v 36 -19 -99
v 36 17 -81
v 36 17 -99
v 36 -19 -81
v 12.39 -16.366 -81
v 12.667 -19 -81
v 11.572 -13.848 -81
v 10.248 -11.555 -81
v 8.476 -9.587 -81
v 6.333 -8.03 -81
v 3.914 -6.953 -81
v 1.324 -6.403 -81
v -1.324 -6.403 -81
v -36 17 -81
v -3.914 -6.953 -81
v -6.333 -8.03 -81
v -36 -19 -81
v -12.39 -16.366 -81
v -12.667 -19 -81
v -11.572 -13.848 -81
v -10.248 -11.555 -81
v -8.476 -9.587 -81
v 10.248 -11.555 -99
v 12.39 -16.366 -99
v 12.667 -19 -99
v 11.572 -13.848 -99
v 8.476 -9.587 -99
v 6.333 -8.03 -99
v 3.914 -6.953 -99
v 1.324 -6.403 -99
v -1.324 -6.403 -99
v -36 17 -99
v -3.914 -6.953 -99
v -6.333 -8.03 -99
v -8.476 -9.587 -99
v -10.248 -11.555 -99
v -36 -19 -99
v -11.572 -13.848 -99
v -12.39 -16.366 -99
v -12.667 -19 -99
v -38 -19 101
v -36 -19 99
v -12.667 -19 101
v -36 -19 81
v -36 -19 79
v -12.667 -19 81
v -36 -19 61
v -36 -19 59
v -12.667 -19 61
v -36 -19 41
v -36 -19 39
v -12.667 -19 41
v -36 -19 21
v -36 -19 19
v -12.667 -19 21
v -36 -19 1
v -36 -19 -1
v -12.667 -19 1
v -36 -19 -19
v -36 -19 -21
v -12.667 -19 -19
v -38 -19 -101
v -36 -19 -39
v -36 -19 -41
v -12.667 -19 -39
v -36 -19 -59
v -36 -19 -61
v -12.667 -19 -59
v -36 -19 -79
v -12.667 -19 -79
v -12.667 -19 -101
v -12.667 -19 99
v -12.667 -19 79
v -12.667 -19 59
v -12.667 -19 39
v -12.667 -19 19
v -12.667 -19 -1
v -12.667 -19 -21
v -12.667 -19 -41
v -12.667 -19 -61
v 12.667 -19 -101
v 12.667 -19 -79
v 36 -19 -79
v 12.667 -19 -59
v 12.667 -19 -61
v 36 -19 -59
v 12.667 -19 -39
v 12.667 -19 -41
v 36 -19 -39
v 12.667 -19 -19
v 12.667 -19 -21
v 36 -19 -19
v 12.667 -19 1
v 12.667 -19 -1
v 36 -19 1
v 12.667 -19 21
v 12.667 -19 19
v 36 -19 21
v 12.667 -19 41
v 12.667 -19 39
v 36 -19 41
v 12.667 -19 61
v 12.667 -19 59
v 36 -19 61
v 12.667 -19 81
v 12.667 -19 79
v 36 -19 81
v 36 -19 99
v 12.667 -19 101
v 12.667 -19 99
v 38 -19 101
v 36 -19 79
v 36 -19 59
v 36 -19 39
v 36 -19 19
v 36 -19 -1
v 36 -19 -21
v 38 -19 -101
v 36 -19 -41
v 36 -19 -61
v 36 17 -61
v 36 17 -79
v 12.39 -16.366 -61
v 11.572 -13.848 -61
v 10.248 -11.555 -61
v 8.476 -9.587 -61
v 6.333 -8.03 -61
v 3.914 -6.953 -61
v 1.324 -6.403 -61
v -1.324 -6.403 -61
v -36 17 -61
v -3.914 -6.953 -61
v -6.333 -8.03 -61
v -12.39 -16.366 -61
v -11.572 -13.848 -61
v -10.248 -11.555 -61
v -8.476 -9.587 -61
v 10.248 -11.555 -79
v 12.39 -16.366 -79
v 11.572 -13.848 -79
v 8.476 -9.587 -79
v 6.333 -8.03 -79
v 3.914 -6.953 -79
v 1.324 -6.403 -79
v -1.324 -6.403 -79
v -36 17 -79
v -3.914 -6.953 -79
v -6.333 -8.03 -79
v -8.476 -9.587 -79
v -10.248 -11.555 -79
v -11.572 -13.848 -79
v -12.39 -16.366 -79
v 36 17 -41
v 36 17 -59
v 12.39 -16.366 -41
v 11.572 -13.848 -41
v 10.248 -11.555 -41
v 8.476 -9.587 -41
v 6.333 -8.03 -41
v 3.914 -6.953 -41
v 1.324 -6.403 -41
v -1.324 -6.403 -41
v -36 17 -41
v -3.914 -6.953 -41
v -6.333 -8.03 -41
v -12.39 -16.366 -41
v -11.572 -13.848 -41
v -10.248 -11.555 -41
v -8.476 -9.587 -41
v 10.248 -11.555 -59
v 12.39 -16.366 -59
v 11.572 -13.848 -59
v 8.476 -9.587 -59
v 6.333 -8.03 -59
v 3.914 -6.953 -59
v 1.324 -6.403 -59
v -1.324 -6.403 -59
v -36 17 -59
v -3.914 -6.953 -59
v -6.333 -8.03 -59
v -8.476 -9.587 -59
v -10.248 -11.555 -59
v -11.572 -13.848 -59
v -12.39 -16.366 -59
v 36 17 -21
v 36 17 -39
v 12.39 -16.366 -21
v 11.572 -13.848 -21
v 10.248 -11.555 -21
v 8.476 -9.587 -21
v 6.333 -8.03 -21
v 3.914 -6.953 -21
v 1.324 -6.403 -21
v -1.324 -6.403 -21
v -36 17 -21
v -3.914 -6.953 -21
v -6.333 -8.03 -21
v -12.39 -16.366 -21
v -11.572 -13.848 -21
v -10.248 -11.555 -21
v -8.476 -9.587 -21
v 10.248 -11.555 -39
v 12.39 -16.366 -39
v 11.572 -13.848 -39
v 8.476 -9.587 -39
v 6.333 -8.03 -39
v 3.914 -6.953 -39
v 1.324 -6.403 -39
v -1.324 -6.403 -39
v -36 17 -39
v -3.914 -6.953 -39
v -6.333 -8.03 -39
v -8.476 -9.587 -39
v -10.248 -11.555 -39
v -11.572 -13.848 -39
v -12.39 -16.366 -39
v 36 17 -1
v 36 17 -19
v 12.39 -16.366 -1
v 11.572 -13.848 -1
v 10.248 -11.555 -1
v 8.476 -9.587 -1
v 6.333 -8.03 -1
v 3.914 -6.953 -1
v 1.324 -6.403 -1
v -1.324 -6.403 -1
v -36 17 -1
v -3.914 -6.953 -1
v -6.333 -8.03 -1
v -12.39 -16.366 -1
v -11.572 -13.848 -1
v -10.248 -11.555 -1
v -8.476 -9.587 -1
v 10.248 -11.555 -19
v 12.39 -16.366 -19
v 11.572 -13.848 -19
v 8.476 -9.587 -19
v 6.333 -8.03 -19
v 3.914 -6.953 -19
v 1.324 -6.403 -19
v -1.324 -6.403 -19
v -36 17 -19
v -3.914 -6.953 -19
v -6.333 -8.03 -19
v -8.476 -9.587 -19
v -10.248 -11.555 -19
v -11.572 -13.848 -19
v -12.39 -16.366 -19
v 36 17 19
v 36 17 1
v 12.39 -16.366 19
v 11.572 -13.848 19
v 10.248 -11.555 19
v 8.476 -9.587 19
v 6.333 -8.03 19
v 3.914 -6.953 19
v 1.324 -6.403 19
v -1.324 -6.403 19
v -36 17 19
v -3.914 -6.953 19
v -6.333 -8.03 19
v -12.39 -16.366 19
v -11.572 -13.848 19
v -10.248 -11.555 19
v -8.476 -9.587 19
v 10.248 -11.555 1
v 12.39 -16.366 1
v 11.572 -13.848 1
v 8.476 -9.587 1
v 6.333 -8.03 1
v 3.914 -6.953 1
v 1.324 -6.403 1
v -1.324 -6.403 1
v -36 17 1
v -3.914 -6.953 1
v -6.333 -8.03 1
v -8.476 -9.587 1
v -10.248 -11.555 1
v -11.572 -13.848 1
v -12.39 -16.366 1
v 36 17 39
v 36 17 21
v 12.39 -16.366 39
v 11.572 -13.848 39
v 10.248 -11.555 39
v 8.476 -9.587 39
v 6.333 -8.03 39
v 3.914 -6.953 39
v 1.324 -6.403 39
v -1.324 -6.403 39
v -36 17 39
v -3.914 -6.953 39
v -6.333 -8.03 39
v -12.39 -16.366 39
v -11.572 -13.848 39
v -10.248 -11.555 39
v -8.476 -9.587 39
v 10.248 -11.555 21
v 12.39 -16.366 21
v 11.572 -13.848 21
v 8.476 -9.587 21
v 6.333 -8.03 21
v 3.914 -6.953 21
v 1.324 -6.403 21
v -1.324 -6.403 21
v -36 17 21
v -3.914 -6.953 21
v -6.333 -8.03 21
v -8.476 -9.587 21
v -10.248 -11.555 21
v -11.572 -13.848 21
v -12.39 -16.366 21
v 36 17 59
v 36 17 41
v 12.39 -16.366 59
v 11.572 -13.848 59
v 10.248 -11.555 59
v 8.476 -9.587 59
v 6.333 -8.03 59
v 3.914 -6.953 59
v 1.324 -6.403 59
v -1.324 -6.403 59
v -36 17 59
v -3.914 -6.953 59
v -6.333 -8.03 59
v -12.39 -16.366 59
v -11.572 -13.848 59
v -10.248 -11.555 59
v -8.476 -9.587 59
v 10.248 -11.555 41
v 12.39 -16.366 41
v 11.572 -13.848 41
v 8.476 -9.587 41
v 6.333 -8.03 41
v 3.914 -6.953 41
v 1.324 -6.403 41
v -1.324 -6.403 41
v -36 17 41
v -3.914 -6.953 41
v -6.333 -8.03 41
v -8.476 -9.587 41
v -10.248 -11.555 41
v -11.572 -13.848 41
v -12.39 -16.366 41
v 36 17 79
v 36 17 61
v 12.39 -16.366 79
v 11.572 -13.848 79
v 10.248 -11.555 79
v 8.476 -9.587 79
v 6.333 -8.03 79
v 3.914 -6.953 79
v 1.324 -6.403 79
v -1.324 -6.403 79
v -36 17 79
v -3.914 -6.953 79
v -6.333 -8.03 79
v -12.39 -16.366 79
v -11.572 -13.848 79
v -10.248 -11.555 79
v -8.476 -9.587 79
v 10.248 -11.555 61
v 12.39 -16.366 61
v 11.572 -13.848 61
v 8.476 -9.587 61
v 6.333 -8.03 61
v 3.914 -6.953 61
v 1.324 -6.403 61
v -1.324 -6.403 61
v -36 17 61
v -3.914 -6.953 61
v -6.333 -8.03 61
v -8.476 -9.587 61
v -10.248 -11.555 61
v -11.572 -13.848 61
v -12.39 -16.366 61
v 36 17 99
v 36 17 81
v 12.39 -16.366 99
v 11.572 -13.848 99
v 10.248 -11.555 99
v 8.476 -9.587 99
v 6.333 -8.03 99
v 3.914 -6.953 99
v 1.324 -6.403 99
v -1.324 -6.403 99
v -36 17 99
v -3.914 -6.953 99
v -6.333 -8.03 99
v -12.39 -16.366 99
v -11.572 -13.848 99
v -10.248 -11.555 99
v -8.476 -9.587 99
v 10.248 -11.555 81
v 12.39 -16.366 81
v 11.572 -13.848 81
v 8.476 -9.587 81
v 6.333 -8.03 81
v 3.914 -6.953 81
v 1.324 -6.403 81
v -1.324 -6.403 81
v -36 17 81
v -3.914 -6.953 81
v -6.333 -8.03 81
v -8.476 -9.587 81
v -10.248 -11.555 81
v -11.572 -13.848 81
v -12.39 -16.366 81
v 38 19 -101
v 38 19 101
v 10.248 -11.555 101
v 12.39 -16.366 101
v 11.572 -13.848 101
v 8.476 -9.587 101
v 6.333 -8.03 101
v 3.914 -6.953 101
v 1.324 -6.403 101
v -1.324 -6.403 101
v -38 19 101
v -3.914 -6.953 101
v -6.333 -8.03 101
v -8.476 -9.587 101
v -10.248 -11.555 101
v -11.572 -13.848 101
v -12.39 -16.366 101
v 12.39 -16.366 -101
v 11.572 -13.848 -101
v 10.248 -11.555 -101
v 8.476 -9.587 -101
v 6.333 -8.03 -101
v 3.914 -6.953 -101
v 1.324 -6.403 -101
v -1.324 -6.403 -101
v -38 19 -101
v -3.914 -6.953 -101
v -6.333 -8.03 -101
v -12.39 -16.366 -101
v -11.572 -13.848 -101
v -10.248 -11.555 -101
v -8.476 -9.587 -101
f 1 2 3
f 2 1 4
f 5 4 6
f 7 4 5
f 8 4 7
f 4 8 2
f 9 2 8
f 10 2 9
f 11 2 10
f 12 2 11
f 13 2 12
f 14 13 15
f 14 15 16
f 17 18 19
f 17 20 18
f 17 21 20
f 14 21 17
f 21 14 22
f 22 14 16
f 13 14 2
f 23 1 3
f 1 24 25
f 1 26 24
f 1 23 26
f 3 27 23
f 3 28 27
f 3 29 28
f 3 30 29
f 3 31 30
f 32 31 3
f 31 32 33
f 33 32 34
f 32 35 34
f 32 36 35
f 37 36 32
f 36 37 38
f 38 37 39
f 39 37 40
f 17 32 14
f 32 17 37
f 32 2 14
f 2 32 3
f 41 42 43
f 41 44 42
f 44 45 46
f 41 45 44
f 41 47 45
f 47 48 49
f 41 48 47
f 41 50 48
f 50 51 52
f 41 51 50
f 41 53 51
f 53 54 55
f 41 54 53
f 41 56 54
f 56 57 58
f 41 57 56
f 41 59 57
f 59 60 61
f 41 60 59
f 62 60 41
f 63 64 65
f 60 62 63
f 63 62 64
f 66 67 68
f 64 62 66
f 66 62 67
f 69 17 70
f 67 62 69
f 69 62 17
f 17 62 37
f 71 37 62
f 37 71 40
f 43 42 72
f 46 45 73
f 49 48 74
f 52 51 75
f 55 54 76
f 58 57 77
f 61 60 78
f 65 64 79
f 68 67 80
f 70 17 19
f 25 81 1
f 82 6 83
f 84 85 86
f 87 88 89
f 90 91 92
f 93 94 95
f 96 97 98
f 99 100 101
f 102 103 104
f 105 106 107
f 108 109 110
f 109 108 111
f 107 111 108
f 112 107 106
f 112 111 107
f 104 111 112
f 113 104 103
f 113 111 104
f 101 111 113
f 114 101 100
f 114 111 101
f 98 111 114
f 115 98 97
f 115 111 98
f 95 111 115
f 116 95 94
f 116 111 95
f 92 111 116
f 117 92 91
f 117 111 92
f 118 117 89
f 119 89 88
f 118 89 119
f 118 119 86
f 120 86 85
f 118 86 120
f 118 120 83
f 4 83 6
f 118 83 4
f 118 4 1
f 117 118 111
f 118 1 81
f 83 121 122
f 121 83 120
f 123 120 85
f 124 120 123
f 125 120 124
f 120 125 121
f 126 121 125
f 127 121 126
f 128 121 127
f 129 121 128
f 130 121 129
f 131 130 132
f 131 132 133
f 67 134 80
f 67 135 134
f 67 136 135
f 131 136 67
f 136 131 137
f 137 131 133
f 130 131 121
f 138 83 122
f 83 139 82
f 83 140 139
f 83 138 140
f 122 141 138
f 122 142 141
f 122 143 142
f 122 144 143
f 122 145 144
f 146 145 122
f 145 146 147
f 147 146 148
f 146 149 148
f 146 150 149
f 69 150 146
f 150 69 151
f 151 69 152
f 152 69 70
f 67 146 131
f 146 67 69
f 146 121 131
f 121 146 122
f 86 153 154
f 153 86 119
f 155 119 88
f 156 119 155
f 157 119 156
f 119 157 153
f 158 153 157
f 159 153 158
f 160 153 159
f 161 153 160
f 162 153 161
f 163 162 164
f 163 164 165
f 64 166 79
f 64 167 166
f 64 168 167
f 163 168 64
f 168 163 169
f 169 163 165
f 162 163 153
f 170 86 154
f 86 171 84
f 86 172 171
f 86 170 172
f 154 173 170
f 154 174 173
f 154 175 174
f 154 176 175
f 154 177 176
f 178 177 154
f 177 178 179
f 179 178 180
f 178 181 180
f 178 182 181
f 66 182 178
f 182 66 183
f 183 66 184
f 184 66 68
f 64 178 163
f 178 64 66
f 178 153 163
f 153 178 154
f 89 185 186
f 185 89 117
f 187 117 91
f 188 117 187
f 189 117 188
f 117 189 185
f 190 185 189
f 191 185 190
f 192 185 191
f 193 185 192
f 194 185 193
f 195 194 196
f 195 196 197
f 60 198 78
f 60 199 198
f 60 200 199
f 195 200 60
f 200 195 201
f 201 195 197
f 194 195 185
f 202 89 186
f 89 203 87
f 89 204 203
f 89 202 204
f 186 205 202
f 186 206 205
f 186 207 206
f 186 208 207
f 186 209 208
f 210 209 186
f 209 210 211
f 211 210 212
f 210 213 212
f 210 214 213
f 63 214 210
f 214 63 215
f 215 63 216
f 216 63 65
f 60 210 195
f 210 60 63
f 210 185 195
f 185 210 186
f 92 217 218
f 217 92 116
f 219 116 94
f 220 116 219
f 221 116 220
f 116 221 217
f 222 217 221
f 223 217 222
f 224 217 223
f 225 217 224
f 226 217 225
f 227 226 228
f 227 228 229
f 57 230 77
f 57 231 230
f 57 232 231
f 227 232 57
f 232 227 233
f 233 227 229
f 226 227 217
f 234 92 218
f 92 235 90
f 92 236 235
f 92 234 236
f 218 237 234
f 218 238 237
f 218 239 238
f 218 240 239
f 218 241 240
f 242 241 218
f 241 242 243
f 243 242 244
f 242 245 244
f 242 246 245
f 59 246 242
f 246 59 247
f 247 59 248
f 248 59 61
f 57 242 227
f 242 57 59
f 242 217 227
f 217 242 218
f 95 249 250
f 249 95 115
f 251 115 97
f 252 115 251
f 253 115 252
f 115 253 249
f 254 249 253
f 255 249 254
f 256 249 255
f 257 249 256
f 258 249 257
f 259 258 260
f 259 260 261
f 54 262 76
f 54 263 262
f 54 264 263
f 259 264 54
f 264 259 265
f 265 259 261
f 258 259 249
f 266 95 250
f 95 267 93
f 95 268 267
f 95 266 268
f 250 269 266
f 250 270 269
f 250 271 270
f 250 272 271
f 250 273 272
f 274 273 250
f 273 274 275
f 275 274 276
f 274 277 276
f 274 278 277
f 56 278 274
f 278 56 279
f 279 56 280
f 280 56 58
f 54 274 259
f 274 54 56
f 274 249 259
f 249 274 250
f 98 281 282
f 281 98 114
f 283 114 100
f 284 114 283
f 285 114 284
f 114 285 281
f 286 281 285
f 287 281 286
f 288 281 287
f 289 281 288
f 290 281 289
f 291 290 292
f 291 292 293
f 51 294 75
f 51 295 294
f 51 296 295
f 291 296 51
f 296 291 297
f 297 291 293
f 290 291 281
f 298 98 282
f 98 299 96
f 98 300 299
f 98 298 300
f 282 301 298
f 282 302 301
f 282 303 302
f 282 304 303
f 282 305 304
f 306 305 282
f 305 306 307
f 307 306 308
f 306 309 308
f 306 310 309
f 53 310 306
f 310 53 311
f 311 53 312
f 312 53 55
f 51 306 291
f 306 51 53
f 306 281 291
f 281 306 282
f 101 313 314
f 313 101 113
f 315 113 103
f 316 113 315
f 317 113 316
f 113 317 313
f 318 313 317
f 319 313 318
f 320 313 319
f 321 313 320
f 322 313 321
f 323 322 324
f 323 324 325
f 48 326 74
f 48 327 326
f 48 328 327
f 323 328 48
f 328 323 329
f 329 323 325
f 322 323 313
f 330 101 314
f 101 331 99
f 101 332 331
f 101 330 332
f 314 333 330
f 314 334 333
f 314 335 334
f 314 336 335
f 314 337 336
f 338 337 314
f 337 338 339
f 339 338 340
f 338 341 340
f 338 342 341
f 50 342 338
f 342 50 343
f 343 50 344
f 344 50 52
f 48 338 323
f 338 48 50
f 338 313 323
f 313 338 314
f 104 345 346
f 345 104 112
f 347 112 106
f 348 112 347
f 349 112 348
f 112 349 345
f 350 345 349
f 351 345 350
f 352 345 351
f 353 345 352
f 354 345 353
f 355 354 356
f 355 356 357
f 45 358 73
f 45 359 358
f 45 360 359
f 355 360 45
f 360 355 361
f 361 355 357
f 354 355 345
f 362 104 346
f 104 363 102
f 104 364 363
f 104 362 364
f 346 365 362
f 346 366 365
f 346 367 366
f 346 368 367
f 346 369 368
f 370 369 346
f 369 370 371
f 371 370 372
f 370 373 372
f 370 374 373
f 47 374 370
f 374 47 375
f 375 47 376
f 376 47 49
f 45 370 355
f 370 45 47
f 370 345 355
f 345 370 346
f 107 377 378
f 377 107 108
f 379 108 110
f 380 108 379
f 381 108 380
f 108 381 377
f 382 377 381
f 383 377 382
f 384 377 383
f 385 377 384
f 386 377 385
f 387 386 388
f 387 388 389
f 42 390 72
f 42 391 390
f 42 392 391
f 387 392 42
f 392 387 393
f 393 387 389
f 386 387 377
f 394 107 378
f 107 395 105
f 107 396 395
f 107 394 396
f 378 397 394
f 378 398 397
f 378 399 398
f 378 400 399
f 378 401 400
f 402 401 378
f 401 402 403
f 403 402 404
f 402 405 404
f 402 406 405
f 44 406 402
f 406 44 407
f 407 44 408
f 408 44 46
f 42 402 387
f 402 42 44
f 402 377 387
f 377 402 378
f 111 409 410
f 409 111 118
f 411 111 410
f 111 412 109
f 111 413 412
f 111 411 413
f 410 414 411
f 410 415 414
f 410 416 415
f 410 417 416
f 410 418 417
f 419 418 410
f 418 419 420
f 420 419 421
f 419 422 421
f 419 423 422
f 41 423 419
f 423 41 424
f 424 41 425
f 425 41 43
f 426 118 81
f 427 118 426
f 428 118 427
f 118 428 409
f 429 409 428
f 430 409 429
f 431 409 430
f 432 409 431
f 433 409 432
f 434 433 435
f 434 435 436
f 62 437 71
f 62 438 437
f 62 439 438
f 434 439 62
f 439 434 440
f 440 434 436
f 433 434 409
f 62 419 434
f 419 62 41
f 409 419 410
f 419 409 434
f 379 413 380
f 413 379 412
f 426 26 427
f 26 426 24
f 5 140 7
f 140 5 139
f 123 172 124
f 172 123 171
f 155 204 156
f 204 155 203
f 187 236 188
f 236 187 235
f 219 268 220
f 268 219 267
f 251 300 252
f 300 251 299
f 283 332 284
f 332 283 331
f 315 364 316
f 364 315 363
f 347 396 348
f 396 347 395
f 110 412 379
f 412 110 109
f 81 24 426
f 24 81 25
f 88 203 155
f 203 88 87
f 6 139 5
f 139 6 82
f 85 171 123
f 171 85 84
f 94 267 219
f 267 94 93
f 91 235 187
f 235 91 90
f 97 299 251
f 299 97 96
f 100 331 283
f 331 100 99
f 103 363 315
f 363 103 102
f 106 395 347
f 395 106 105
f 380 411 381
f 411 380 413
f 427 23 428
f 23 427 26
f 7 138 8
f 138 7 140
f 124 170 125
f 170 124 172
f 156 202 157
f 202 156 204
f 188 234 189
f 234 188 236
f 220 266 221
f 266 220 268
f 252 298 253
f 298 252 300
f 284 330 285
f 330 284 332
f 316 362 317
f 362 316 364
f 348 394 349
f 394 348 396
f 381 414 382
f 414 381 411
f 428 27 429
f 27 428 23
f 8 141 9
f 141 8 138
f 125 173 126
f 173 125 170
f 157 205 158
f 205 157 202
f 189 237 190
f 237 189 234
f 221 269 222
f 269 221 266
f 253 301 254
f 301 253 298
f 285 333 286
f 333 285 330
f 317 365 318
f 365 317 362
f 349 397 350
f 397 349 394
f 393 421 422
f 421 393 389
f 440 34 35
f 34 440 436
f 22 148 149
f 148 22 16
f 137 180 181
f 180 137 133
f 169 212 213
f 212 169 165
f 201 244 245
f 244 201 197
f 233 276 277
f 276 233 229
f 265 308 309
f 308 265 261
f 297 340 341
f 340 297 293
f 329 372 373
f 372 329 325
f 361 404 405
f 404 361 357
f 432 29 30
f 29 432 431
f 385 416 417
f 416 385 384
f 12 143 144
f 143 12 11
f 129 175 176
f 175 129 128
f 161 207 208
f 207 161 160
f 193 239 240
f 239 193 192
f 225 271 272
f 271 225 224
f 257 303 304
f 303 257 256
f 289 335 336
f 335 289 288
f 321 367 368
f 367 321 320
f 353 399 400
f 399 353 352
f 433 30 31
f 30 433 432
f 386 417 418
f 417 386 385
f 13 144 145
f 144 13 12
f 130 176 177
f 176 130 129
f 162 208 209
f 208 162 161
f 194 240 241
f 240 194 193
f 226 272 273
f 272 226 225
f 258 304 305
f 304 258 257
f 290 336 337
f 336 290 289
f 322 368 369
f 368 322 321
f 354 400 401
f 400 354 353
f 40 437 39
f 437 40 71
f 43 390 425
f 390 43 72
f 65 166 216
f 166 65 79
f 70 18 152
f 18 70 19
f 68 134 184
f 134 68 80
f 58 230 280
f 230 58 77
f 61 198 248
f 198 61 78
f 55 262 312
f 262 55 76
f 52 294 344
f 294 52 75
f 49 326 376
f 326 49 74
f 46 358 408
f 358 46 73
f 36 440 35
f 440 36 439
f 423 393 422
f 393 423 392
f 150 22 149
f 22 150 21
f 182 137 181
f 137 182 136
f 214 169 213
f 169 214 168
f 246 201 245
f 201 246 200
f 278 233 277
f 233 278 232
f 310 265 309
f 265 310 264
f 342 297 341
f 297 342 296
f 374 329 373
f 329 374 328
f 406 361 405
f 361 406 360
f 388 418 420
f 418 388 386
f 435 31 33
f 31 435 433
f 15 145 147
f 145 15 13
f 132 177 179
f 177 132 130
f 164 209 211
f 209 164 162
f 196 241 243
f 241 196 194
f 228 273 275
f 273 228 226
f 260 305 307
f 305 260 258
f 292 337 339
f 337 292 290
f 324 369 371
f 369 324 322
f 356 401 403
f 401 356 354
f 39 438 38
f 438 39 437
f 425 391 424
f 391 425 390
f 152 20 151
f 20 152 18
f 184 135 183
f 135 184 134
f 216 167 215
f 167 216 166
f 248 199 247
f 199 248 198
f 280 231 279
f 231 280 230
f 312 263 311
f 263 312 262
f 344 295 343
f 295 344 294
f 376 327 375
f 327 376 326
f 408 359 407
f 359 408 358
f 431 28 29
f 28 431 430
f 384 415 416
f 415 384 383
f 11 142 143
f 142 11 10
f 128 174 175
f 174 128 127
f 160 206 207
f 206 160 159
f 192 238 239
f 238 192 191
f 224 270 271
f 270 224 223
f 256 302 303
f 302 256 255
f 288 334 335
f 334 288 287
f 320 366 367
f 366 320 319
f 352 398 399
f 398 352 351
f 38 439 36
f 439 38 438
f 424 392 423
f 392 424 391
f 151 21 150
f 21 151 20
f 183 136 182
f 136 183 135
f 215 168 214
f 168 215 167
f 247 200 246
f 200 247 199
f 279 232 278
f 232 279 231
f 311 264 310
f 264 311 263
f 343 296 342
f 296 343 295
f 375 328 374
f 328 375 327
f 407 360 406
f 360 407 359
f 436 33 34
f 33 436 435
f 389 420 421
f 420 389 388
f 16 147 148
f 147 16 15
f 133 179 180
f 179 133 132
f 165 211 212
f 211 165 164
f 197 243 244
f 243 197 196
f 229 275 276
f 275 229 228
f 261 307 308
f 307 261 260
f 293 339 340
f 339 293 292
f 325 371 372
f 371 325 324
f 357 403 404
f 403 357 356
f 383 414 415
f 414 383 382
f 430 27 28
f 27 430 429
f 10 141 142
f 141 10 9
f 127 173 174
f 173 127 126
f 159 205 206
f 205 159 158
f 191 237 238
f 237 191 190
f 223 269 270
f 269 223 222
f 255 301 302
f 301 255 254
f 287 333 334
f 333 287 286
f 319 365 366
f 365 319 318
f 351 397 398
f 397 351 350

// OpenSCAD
// Tray Parameters
$slots = 10;
$trayWalls = 2; // [2:0.5:8]
$trayHeightPct = 50; // [20:5:80]

// Magnet Box Size
$boxWidth = 72;
$boxLength = 72;
$boxHeight = 18;

{}

// Overall Width
$oaw = $boxWidth + $trayWalls * 2;

// Overall Height
$oah = $boxHeight * $slots + $trayWalls * ($slots - 1) + $trayWalls * 2;

// Overall Depth
$oad = $boxLength * $trayHeightPct/100 + $trayWalls;

difference() {
    // Main Tray Body
    cube([$oaw,$oad,$oah], center = true);
    
    // Box Cutouts
    $cutoutDepth = $boxLength * $trayHeightPct/100;
    $cutoutY = $oad / 2 - $trayWalls - $cutoutDepth / 2;
    $cutoutStackHeight = $slots * $boxHeight + ($slots - 1) * $trayWalls;

    for (i = [0:$slots - 1]) {
        $cutoutZ = -$cutoutStackHeight / 2 + $boxHeight / 2 + i * ($boxHeight + $trayWalls);
        translate([0, $cutoutY, $cutoutZ])
        cube([$boxWidth, $cutoutDepth, $boxHeight], center = true);
    }
    
    translate([0,-$oad/2,0])
    #cylinder(h = $oah, d = $oad/1.5, center = true);
}
